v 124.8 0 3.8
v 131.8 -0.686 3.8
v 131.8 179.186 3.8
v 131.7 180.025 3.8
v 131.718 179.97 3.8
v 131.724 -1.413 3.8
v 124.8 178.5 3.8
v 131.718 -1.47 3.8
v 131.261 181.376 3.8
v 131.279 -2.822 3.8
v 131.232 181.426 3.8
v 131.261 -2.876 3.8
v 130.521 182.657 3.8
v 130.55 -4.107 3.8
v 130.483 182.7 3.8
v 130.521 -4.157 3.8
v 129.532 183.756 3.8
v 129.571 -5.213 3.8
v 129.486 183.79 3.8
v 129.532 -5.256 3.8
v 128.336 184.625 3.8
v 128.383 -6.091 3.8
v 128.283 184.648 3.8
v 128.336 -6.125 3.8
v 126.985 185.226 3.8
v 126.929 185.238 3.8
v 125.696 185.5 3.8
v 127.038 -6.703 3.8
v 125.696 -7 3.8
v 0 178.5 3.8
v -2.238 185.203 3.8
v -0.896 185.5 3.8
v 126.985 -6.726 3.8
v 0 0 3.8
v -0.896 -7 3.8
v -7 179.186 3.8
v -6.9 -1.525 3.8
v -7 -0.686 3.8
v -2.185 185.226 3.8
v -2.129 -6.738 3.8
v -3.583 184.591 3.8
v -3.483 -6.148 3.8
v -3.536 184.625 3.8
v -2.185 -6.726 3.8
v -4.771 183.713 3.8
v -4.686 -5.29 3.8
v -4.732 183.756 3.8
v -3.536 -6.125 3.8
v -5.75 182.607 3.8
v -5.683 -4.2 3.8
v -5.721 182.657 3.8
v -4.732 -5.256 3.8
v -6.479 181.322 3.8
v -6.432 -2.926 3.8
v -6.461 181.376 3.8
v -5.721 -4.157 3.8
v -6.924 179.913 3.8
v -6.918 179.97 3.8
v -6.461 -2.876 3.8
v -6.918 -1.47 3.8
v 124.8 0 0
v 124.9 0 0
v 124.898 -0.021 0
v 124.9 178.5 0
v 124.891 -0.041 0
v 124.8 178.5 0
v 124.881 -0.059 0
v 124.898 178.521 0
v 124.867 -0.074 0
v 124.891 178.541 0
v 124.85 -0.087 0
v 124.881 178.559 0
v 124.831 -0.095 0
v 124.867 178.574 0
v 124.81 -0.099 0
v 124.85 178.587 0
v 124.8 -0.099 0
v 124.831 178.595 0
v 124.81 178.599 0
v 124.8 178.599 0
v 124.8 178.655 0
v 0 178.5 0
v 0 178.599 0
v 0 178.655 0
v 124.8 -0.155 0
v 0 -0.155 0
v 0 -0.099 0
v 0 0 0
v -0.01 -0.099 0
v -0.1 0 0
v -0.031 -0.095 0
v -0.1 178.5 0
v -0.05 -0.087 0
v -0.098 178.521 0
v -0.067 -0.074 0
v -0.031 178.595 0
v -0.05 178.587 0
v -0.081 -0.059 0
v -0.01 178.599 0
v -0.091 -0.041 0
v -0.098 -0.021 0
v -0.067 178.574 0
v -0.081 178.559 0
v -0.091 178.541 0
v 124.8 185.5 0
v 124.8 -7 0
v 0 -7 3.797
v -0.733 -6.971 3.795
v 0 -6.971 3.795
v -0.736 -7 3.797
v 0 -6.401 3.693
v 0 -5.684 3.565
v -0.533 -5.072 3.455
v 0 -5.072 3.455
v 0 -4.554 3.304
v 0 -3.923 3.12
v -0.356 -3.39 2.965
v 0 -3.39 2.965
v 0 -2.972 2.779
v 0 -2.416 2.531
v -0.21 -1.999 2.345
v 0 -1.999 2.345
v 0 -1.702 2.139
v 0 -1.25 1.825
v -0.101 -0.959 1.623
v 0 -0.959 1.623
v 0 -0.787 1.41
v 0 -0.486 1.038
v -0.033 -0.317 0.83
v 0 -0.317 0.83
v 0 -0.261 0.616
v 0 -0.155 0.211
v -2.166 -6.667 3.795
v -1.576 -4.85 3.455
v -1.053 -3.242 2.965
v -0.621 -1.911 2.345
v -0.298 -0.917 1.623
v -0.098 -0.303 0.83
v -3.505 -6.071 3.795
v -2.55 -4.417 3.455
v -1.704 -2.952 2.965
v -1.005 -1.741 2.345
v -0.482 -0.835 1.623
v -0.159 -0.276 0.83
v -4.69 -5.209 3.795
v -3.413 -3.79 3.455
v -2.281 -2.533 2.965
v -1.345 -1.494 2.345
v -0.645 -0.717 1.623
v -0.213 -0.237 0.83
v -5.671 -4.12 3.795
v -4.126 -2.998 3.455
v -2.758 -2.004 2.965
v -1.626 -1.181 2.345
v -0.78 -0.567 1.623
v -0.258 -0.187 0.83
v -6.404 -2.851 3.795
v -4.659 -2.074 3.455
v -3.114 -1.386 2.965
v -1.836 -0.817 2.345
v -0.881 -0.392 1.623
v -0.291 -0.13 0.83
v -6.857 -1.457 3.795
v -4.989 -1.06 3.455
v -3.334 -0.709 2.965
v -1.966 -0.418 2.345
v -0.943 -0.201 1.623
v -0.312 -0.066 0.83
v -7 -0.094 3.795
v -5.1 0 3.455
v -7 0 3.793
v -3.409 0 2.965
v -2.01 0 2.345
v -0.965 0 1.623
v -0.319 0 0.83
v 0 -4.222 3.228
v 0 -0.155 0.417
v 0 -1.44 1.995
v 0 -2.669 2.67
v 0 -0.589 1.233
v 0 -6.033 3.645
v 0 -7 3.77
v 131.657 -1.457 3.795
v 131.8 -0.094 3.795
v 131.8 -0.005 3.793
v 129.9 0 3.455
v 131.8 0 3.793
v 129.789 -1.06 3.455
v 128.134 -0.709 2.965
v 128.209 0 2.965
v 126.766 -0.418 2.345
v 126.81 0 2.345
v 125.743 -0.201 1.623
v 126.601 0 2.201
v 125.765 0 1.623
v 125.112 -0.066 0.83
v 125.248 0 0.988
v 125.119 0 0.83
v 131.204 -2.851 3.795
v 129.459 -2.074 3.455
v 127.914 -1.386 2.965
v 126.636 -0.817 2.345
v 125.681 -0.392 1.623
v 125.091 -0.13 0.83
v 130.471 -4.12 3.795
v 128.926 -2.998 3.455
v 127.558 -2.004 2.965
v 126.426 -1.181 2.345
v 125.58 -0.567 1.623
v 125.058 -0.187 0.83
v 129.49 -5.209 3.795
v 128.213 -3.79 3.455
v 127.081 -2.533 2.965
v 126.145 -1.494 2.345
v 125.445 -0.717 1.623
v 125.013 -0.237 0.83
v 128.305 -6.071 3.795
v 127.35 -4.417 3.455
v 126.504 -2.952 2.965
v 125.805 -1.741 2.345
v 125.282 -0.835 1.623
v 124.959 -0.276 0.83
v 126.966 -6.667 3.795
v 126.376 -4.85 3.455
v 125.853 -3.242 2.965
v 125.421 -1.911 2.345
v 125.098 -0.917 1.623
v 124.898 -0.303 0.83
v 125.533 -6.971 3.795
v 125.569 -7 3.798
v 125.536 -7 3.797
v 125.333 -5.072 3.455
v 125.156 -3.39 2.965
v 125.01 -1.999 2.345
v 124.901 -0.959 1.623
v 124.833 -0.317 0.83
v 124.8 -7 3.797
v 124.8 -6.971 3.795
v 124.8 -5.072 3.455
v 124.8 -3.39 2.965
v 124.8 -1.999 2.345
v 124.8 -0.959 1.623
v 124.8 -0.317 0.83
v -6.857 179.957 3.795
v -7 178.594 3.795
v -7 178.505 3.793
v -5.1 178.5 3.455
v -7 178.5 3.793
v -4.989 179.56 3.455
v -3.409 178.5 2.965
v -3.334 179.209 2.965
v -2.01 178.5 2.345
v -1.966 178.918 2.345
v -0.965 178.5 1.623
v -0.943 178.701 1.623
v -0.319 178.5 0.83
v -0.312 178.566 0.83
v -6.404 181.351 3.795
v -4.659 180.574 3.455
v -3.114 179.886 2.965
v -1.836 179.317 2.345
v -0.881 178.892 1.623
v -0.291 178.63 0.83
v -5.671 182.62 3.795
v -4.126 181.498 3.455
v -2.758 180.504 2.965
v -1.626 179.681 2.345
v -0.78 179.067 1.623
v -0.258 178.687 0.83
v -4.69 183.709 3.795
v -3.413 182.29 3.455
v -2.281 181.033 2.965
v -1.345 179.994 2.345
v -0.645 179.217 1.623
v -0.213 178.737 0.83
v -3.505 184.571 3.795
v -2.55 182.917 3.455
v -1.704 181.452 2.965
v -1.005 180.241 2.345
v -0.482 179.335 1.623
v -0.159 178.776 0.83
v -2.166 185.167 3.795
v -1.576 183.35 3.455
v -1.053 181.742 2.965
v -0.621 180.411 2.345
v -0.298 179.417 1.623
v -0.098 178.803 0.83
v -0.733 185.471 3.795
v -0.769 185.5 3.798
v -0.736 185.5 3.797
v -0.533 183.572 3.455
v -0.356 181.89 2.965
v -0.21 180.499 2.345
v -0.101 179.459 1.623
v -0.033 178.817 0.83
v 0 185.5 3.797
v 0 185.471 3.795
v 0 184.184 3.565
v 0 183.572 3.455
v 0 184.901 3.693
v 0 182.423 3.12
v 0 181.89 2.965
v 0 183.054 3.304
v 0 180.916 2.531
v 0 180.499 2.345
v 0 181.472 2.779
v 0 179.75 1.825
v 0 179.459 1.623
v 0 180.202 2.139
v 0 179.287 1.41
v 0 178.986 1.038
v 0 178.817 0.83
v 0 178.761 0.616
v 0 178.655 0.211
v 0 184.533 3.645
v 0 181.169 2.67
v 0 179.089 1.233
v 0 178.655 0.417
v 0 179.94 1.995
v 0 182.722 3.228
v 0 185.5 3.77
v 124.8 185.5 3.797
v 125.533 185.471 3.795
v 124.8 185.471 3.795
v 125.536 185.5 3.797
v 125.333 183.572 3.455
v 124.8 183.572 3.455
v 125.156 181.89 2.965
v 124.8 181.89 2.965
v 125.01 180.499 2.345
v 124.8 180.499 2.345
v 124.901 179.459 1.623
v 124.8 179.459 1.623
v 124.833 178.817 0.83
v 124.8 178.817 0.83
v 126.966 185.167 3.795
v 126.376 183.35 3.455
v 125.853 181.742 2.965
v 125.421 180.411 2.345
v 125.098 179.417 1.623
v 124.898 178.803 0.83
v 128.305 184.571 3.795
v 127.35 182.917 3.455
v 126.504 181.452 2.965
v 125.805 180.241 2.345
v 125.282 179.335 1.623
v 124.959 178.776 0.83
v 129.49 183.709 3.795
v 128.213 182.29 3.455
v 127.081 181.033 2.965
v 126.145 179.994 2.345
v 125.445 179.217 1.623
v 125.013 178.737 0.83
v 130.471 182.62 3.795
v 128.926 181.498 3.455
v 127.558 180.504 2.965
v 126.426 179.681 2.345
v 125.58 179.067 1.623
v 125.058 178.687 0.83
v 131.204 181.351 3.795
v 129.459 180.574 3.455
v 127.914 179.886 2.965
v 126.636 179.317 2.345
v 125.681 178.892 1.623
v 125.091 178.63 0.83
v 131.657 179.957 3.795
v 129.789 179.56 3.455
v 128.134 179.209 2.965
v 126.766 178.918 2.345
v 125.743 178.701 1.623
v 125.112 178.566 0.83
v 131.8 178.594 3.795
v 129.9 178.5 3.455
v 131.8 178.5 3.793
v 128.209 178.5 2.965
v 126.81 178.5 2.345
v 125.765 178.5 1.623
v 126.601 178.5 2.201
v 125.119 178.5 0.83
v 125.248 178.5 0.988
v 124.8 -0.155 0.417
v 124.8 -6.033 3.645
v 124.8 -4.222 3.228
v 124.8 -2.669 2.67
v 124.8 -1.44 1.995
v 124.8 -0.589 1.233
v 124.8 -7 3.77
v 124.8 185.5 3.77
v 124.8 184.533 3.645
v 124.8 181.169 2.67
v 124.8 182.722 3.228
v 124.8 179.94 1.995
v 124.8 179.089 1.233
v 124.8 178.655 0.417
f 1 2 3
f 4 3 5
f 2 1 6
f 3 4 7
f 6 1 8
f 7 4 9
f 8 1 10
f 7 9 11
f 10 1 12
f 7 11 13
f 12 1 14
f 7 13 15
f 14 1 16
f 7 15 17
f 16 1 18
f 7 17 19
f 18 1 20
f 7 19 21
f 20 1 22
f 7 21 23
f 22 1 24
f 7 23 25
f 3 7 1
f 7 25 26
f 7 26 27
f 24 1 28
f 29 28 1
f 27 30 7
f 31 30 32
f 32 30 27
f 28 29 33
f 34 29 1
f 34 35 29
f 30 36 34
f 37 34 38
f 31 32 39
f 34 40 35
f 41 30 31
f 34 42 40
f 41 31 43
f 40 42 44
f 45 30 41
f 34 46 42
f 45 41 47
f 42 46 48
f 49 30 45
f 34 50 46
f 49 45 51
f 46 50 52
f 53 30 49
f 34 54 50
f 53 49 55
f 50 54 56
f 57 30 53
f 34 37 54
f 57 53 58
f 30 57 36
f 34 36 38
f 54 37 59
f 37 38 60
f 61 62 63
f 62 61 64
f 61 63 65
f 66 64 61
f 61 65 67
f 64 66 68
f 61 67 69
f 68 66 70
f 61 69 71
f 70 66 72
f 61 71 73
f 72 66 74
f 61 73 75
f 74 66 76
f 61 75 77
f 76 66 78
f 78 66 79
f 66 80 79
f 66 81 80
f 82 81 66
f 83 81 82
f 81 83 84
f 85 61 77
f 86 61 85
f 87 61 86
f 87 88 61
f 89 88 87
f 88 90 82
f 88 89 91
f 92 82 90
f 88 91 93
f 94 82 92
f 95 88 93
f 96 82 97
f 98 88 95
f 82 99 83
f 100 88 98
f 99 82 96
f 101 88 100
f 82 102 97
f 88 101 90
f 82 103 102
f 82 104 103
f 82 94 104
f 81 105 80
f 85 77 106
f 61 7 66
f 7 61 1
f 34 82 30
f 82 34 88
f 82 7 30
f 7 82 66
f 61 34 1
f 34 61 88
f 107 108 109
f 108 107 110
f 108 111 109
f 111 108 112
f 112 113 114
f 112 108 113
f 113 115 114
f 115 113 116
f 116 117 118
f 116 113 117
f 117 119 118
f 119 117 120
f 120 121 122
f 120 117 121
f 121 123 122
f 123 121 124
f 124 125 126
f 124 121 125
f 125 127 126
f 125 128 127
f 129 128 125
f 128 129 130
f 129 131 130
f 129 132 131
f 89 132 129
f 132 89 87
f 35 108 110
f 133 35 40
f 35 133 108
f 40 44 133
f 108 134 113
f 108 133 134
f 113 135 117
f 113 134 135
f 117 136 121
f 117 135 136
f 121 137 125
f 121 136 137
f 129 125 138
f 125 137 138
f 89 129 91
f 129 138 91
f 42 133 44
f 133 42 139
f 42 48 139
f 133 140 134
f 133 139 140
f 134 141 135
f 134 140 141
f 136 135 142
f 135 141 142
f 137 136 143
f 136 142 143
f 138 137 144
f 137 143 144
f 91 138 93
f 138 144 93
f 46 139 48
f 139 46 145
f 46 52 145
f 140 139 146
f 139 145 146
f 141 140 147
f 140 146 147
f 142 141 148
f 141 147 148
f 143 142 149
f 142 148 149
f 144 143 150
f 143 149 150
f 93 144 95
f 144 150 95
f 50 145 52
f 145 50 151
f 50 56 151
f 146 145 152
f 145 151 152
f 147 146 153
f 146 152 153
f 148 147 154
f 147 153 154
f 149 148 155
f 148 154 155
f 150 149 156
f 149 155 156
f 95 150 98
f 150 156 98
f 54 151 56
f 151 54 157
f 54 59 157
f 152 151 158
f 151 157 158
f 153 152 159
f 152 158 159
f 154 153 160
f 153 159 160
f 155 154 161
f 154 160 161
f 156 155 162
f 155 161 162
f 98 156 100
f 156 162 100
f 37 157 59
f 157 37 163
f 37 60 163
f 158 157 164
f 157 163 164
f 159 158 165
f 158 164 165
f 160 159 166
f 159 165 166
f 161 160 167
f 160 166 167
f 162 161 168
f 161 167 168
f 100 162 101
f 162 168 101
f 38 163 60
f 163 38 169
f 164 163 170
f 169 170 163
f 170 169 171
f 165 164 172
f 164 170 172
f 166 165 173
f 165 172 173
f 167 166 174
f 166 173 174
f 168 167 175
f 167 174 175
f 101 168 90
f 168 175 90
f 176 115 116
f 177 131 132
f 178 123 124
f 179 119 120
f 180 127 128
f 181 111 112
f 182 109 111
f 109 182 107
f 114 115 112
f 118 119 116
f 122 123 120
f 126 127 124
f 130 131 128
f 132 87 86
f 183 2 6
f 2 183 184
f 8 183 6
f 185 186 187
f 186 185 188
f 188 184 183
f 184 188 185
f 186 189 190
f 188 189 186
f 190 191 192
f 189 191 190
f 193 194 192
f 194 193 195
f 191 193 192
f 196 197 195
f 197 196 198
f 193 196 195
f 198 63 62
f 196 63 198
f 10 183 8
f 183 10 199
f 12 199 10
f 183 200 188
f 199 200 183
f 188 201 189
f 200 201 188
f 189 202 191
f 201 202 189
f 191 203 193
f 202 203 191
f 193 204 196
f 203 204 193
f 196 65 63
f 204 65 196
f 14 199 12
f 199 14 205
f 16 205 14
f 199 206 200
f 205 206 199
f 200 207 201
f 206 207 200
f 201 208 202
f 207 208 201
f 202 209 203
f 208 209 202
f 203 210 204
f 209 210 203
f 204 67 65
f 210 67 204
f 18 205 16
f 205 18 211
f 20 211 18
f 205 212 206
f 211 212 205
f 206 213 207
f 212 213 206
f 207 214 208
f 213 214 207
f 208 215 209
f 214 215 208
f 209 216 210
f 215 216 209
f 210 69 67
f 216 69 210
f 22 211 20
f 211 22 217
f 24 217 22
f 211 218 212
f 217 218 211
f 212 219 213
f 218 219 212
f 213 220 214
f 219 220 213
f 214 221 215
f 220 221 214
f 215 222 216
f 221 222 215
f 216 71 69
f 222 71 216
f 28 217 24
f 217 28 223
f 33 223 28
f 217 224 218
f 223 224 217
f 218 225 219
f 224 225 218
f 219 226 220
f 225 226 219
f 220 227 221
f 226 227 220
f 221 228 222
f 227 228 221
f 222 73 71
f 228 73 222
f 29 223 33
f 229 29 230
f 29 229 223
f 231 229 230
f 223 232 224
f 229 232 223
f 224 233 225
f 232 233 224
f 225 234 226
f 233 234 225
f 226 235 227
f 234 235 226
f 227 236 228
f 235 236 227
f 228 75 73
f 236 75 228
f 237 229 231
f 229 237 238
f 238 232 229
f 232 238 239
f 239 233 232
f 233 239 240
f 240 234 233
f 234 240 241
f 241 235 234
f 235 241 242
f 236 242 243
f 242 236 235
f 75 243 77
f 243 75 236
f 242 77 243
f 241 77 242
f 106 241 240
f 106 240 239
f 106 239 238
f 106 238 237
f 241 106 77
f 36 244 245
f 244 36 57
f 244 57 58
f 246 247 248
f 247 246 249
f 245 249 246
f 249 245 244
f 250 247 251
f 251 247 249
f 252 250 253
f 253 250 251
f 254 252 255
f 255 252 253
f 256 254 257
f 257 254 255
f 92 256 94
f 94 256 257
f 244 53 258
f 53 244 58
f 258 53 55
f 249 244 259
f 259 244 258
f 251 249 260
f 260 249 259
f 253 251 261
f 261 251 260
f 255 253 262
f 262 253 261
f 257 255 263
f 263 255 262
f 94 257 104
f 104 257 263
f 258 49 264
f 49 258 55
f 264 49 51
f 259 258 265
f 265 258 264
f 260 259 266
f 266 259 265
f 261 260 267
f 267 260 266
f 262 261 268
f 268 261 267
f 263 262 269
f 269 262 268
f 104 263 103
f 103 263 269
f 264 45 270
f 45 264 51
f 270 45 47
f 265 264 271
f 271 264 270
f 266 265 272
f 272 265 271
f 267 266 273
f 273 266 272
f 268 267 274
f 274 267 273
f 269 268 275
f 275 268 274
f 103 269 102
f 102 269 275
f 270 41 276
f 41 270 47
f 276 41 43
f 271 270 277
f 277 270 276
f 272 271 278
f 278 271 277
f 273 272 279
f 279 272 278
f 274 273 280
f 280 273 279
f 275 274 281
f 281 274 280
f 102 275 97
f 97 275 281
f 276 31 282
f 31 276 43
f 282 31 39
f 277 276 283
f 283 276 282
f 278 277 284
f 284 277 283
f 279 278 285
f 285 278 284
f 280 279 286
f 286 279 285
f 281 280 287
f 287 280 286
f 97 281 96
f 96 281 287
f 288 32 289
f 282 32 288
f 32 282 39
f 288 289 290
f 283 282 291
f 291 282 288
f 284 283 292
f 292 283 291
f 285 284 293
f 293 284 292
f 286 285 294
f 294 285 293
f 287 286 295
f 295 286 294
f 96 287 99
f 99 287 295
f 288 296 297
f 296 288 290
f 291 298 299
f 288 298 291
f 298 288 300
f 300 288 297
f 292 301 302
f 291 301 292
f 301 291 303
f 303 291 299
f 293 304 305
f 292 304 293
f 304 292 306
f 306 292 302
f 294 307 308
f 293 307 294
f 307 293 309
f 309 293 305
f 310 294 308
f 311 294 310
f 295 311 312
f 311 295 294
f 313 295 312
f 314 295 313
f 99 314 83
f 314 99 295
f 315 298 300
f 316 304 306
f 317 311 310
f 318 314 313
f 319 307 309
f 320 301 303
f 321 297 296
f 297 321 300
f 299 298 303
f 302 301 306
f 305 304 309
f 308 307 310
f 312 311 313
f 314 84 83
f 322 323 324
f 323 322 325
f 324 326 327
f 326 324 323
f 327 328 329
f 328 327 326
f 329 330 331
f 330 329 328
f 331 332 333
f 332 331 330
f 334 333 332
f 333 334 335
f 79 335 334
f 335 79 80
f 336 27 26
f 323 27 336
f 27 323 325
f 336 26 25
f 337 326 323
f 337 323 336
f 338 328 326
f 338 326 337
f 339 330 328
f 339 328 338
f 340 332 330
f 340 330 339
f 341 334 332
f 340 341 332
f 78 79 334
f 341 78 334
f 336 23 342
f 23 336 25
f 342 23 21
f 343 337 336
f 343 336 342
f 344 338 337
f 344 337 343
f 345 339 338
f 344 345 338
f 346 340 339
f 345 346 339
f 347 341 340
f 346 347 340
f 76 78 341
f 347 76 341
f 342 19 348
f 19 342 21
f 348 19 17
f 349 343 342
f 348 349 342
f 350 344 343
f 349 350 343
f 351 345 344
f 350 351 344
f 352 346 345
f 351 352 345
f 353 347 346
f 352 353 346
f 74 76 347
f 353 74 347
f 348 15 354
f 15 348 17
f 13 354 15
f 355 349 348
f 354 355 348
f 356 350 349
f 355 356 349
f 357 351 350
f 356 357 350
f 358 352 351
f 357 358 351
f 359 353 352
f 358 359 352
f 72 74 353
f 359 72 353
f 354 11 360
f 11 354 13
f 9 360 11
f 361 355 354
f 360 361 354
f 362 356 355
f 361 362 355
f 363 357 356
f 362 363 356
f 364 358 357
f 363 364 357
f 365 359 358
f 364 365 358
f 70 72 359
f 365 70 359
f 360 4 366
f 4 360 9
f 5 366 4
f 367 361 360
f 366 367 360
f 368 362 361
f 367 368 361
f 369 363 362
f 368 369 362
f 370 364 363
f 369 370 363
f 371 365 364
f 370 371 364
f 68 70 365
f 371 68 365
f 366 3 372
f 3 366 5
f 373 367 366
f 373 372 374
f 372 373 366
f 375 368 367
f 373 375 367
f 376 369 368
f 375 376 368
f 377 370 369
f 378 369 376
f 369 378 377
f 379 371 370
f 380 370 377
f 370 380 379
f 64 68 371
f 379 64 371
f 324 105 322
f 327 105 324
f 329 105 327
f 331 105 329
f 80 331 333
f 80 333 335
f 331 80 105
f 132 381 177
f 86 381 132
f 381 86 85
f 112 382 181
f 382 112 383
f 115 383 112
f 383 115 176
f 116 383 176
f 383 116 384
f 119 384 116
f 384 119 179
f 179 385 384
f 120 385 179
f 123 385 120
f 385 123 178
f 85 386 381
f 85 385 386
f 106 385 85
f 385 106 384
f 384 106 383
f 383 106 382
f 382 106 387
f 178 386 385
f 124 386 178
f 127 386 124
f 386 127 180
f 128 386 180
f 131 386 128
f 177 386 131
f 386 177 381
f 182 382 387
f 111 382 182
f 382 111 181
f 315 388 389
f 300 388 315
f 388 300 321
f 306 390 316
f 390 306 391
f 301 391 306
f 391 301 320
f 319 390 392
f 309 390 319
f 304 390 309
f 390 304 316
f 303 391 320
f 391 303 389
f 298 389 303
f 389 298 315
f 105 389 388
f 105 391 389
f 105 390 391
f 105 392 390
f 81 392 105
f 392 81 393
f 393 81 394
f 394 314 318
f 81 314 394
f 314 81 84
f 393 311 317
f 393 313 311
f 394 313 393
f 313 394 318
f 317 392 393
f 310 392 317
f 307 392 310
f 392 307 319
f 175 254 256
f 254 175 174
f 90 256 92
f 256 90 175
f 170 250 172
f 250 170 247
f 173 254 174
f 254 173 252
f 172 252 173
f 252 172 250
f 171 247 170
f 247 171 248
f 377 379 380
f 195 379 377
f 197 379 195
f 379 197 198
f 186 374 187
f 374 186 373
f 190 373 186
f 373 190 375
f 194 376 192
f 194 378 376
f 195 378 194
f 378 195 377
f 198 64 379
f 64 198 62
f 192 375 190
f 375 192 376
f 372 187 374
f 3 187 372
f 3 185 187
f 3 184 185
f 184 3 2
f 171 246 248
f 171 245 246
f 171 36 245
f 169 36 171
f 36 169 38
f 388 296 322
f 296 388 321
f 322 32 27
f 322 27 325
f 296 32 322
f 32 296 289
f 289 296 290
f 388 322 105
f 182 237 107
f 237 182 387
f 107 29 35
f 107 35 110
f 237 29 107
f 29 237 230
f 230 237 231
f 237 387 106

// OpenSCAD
use <MCAD/regular_shapes.scad>

r = 10;

x = 124.8;
y = 178.5;
z = 3.8;

rim = 0.1;
trim = r*1.4;

intersection(){
difference(){
    difference(){
        translate([-r-rim, -r-rim, 0])
        cube([x + 2*(r + rim), y + 2*(r + rim), z]);
        cube([x, y, z]);
    }

    scale([1, 1, 1.05*z/r]){
        for (pos = [[[0, 0, 0], 180], [[x, 0, 0], -90], [[0, y, 0], 90], [[x, y, 0], 0]]){
            translate(pos[0])
            intersection(){
                torus2(r + rim, r);
                rotate([0, 0, pos[1]])
                translate([0, 0, -1.5*r])
                cube(3 * r);
            }
        }

        for (yo = [-r-rim, y + r + rim]){
            translate([0, yo, 0])
            rotate([0, 90, 0])
            cylinder(x, r, r);
        }

        for (xo = [-rim-r, x + rim + r]){
            translate([xo, 0, 0])
            rotate([-90, 0, 0])
            cylinder(y, r, r);
        }
    }
}
translate([-trim/2, -trim/2, 0])
cube([x + trim, y + trim, z]);
}
